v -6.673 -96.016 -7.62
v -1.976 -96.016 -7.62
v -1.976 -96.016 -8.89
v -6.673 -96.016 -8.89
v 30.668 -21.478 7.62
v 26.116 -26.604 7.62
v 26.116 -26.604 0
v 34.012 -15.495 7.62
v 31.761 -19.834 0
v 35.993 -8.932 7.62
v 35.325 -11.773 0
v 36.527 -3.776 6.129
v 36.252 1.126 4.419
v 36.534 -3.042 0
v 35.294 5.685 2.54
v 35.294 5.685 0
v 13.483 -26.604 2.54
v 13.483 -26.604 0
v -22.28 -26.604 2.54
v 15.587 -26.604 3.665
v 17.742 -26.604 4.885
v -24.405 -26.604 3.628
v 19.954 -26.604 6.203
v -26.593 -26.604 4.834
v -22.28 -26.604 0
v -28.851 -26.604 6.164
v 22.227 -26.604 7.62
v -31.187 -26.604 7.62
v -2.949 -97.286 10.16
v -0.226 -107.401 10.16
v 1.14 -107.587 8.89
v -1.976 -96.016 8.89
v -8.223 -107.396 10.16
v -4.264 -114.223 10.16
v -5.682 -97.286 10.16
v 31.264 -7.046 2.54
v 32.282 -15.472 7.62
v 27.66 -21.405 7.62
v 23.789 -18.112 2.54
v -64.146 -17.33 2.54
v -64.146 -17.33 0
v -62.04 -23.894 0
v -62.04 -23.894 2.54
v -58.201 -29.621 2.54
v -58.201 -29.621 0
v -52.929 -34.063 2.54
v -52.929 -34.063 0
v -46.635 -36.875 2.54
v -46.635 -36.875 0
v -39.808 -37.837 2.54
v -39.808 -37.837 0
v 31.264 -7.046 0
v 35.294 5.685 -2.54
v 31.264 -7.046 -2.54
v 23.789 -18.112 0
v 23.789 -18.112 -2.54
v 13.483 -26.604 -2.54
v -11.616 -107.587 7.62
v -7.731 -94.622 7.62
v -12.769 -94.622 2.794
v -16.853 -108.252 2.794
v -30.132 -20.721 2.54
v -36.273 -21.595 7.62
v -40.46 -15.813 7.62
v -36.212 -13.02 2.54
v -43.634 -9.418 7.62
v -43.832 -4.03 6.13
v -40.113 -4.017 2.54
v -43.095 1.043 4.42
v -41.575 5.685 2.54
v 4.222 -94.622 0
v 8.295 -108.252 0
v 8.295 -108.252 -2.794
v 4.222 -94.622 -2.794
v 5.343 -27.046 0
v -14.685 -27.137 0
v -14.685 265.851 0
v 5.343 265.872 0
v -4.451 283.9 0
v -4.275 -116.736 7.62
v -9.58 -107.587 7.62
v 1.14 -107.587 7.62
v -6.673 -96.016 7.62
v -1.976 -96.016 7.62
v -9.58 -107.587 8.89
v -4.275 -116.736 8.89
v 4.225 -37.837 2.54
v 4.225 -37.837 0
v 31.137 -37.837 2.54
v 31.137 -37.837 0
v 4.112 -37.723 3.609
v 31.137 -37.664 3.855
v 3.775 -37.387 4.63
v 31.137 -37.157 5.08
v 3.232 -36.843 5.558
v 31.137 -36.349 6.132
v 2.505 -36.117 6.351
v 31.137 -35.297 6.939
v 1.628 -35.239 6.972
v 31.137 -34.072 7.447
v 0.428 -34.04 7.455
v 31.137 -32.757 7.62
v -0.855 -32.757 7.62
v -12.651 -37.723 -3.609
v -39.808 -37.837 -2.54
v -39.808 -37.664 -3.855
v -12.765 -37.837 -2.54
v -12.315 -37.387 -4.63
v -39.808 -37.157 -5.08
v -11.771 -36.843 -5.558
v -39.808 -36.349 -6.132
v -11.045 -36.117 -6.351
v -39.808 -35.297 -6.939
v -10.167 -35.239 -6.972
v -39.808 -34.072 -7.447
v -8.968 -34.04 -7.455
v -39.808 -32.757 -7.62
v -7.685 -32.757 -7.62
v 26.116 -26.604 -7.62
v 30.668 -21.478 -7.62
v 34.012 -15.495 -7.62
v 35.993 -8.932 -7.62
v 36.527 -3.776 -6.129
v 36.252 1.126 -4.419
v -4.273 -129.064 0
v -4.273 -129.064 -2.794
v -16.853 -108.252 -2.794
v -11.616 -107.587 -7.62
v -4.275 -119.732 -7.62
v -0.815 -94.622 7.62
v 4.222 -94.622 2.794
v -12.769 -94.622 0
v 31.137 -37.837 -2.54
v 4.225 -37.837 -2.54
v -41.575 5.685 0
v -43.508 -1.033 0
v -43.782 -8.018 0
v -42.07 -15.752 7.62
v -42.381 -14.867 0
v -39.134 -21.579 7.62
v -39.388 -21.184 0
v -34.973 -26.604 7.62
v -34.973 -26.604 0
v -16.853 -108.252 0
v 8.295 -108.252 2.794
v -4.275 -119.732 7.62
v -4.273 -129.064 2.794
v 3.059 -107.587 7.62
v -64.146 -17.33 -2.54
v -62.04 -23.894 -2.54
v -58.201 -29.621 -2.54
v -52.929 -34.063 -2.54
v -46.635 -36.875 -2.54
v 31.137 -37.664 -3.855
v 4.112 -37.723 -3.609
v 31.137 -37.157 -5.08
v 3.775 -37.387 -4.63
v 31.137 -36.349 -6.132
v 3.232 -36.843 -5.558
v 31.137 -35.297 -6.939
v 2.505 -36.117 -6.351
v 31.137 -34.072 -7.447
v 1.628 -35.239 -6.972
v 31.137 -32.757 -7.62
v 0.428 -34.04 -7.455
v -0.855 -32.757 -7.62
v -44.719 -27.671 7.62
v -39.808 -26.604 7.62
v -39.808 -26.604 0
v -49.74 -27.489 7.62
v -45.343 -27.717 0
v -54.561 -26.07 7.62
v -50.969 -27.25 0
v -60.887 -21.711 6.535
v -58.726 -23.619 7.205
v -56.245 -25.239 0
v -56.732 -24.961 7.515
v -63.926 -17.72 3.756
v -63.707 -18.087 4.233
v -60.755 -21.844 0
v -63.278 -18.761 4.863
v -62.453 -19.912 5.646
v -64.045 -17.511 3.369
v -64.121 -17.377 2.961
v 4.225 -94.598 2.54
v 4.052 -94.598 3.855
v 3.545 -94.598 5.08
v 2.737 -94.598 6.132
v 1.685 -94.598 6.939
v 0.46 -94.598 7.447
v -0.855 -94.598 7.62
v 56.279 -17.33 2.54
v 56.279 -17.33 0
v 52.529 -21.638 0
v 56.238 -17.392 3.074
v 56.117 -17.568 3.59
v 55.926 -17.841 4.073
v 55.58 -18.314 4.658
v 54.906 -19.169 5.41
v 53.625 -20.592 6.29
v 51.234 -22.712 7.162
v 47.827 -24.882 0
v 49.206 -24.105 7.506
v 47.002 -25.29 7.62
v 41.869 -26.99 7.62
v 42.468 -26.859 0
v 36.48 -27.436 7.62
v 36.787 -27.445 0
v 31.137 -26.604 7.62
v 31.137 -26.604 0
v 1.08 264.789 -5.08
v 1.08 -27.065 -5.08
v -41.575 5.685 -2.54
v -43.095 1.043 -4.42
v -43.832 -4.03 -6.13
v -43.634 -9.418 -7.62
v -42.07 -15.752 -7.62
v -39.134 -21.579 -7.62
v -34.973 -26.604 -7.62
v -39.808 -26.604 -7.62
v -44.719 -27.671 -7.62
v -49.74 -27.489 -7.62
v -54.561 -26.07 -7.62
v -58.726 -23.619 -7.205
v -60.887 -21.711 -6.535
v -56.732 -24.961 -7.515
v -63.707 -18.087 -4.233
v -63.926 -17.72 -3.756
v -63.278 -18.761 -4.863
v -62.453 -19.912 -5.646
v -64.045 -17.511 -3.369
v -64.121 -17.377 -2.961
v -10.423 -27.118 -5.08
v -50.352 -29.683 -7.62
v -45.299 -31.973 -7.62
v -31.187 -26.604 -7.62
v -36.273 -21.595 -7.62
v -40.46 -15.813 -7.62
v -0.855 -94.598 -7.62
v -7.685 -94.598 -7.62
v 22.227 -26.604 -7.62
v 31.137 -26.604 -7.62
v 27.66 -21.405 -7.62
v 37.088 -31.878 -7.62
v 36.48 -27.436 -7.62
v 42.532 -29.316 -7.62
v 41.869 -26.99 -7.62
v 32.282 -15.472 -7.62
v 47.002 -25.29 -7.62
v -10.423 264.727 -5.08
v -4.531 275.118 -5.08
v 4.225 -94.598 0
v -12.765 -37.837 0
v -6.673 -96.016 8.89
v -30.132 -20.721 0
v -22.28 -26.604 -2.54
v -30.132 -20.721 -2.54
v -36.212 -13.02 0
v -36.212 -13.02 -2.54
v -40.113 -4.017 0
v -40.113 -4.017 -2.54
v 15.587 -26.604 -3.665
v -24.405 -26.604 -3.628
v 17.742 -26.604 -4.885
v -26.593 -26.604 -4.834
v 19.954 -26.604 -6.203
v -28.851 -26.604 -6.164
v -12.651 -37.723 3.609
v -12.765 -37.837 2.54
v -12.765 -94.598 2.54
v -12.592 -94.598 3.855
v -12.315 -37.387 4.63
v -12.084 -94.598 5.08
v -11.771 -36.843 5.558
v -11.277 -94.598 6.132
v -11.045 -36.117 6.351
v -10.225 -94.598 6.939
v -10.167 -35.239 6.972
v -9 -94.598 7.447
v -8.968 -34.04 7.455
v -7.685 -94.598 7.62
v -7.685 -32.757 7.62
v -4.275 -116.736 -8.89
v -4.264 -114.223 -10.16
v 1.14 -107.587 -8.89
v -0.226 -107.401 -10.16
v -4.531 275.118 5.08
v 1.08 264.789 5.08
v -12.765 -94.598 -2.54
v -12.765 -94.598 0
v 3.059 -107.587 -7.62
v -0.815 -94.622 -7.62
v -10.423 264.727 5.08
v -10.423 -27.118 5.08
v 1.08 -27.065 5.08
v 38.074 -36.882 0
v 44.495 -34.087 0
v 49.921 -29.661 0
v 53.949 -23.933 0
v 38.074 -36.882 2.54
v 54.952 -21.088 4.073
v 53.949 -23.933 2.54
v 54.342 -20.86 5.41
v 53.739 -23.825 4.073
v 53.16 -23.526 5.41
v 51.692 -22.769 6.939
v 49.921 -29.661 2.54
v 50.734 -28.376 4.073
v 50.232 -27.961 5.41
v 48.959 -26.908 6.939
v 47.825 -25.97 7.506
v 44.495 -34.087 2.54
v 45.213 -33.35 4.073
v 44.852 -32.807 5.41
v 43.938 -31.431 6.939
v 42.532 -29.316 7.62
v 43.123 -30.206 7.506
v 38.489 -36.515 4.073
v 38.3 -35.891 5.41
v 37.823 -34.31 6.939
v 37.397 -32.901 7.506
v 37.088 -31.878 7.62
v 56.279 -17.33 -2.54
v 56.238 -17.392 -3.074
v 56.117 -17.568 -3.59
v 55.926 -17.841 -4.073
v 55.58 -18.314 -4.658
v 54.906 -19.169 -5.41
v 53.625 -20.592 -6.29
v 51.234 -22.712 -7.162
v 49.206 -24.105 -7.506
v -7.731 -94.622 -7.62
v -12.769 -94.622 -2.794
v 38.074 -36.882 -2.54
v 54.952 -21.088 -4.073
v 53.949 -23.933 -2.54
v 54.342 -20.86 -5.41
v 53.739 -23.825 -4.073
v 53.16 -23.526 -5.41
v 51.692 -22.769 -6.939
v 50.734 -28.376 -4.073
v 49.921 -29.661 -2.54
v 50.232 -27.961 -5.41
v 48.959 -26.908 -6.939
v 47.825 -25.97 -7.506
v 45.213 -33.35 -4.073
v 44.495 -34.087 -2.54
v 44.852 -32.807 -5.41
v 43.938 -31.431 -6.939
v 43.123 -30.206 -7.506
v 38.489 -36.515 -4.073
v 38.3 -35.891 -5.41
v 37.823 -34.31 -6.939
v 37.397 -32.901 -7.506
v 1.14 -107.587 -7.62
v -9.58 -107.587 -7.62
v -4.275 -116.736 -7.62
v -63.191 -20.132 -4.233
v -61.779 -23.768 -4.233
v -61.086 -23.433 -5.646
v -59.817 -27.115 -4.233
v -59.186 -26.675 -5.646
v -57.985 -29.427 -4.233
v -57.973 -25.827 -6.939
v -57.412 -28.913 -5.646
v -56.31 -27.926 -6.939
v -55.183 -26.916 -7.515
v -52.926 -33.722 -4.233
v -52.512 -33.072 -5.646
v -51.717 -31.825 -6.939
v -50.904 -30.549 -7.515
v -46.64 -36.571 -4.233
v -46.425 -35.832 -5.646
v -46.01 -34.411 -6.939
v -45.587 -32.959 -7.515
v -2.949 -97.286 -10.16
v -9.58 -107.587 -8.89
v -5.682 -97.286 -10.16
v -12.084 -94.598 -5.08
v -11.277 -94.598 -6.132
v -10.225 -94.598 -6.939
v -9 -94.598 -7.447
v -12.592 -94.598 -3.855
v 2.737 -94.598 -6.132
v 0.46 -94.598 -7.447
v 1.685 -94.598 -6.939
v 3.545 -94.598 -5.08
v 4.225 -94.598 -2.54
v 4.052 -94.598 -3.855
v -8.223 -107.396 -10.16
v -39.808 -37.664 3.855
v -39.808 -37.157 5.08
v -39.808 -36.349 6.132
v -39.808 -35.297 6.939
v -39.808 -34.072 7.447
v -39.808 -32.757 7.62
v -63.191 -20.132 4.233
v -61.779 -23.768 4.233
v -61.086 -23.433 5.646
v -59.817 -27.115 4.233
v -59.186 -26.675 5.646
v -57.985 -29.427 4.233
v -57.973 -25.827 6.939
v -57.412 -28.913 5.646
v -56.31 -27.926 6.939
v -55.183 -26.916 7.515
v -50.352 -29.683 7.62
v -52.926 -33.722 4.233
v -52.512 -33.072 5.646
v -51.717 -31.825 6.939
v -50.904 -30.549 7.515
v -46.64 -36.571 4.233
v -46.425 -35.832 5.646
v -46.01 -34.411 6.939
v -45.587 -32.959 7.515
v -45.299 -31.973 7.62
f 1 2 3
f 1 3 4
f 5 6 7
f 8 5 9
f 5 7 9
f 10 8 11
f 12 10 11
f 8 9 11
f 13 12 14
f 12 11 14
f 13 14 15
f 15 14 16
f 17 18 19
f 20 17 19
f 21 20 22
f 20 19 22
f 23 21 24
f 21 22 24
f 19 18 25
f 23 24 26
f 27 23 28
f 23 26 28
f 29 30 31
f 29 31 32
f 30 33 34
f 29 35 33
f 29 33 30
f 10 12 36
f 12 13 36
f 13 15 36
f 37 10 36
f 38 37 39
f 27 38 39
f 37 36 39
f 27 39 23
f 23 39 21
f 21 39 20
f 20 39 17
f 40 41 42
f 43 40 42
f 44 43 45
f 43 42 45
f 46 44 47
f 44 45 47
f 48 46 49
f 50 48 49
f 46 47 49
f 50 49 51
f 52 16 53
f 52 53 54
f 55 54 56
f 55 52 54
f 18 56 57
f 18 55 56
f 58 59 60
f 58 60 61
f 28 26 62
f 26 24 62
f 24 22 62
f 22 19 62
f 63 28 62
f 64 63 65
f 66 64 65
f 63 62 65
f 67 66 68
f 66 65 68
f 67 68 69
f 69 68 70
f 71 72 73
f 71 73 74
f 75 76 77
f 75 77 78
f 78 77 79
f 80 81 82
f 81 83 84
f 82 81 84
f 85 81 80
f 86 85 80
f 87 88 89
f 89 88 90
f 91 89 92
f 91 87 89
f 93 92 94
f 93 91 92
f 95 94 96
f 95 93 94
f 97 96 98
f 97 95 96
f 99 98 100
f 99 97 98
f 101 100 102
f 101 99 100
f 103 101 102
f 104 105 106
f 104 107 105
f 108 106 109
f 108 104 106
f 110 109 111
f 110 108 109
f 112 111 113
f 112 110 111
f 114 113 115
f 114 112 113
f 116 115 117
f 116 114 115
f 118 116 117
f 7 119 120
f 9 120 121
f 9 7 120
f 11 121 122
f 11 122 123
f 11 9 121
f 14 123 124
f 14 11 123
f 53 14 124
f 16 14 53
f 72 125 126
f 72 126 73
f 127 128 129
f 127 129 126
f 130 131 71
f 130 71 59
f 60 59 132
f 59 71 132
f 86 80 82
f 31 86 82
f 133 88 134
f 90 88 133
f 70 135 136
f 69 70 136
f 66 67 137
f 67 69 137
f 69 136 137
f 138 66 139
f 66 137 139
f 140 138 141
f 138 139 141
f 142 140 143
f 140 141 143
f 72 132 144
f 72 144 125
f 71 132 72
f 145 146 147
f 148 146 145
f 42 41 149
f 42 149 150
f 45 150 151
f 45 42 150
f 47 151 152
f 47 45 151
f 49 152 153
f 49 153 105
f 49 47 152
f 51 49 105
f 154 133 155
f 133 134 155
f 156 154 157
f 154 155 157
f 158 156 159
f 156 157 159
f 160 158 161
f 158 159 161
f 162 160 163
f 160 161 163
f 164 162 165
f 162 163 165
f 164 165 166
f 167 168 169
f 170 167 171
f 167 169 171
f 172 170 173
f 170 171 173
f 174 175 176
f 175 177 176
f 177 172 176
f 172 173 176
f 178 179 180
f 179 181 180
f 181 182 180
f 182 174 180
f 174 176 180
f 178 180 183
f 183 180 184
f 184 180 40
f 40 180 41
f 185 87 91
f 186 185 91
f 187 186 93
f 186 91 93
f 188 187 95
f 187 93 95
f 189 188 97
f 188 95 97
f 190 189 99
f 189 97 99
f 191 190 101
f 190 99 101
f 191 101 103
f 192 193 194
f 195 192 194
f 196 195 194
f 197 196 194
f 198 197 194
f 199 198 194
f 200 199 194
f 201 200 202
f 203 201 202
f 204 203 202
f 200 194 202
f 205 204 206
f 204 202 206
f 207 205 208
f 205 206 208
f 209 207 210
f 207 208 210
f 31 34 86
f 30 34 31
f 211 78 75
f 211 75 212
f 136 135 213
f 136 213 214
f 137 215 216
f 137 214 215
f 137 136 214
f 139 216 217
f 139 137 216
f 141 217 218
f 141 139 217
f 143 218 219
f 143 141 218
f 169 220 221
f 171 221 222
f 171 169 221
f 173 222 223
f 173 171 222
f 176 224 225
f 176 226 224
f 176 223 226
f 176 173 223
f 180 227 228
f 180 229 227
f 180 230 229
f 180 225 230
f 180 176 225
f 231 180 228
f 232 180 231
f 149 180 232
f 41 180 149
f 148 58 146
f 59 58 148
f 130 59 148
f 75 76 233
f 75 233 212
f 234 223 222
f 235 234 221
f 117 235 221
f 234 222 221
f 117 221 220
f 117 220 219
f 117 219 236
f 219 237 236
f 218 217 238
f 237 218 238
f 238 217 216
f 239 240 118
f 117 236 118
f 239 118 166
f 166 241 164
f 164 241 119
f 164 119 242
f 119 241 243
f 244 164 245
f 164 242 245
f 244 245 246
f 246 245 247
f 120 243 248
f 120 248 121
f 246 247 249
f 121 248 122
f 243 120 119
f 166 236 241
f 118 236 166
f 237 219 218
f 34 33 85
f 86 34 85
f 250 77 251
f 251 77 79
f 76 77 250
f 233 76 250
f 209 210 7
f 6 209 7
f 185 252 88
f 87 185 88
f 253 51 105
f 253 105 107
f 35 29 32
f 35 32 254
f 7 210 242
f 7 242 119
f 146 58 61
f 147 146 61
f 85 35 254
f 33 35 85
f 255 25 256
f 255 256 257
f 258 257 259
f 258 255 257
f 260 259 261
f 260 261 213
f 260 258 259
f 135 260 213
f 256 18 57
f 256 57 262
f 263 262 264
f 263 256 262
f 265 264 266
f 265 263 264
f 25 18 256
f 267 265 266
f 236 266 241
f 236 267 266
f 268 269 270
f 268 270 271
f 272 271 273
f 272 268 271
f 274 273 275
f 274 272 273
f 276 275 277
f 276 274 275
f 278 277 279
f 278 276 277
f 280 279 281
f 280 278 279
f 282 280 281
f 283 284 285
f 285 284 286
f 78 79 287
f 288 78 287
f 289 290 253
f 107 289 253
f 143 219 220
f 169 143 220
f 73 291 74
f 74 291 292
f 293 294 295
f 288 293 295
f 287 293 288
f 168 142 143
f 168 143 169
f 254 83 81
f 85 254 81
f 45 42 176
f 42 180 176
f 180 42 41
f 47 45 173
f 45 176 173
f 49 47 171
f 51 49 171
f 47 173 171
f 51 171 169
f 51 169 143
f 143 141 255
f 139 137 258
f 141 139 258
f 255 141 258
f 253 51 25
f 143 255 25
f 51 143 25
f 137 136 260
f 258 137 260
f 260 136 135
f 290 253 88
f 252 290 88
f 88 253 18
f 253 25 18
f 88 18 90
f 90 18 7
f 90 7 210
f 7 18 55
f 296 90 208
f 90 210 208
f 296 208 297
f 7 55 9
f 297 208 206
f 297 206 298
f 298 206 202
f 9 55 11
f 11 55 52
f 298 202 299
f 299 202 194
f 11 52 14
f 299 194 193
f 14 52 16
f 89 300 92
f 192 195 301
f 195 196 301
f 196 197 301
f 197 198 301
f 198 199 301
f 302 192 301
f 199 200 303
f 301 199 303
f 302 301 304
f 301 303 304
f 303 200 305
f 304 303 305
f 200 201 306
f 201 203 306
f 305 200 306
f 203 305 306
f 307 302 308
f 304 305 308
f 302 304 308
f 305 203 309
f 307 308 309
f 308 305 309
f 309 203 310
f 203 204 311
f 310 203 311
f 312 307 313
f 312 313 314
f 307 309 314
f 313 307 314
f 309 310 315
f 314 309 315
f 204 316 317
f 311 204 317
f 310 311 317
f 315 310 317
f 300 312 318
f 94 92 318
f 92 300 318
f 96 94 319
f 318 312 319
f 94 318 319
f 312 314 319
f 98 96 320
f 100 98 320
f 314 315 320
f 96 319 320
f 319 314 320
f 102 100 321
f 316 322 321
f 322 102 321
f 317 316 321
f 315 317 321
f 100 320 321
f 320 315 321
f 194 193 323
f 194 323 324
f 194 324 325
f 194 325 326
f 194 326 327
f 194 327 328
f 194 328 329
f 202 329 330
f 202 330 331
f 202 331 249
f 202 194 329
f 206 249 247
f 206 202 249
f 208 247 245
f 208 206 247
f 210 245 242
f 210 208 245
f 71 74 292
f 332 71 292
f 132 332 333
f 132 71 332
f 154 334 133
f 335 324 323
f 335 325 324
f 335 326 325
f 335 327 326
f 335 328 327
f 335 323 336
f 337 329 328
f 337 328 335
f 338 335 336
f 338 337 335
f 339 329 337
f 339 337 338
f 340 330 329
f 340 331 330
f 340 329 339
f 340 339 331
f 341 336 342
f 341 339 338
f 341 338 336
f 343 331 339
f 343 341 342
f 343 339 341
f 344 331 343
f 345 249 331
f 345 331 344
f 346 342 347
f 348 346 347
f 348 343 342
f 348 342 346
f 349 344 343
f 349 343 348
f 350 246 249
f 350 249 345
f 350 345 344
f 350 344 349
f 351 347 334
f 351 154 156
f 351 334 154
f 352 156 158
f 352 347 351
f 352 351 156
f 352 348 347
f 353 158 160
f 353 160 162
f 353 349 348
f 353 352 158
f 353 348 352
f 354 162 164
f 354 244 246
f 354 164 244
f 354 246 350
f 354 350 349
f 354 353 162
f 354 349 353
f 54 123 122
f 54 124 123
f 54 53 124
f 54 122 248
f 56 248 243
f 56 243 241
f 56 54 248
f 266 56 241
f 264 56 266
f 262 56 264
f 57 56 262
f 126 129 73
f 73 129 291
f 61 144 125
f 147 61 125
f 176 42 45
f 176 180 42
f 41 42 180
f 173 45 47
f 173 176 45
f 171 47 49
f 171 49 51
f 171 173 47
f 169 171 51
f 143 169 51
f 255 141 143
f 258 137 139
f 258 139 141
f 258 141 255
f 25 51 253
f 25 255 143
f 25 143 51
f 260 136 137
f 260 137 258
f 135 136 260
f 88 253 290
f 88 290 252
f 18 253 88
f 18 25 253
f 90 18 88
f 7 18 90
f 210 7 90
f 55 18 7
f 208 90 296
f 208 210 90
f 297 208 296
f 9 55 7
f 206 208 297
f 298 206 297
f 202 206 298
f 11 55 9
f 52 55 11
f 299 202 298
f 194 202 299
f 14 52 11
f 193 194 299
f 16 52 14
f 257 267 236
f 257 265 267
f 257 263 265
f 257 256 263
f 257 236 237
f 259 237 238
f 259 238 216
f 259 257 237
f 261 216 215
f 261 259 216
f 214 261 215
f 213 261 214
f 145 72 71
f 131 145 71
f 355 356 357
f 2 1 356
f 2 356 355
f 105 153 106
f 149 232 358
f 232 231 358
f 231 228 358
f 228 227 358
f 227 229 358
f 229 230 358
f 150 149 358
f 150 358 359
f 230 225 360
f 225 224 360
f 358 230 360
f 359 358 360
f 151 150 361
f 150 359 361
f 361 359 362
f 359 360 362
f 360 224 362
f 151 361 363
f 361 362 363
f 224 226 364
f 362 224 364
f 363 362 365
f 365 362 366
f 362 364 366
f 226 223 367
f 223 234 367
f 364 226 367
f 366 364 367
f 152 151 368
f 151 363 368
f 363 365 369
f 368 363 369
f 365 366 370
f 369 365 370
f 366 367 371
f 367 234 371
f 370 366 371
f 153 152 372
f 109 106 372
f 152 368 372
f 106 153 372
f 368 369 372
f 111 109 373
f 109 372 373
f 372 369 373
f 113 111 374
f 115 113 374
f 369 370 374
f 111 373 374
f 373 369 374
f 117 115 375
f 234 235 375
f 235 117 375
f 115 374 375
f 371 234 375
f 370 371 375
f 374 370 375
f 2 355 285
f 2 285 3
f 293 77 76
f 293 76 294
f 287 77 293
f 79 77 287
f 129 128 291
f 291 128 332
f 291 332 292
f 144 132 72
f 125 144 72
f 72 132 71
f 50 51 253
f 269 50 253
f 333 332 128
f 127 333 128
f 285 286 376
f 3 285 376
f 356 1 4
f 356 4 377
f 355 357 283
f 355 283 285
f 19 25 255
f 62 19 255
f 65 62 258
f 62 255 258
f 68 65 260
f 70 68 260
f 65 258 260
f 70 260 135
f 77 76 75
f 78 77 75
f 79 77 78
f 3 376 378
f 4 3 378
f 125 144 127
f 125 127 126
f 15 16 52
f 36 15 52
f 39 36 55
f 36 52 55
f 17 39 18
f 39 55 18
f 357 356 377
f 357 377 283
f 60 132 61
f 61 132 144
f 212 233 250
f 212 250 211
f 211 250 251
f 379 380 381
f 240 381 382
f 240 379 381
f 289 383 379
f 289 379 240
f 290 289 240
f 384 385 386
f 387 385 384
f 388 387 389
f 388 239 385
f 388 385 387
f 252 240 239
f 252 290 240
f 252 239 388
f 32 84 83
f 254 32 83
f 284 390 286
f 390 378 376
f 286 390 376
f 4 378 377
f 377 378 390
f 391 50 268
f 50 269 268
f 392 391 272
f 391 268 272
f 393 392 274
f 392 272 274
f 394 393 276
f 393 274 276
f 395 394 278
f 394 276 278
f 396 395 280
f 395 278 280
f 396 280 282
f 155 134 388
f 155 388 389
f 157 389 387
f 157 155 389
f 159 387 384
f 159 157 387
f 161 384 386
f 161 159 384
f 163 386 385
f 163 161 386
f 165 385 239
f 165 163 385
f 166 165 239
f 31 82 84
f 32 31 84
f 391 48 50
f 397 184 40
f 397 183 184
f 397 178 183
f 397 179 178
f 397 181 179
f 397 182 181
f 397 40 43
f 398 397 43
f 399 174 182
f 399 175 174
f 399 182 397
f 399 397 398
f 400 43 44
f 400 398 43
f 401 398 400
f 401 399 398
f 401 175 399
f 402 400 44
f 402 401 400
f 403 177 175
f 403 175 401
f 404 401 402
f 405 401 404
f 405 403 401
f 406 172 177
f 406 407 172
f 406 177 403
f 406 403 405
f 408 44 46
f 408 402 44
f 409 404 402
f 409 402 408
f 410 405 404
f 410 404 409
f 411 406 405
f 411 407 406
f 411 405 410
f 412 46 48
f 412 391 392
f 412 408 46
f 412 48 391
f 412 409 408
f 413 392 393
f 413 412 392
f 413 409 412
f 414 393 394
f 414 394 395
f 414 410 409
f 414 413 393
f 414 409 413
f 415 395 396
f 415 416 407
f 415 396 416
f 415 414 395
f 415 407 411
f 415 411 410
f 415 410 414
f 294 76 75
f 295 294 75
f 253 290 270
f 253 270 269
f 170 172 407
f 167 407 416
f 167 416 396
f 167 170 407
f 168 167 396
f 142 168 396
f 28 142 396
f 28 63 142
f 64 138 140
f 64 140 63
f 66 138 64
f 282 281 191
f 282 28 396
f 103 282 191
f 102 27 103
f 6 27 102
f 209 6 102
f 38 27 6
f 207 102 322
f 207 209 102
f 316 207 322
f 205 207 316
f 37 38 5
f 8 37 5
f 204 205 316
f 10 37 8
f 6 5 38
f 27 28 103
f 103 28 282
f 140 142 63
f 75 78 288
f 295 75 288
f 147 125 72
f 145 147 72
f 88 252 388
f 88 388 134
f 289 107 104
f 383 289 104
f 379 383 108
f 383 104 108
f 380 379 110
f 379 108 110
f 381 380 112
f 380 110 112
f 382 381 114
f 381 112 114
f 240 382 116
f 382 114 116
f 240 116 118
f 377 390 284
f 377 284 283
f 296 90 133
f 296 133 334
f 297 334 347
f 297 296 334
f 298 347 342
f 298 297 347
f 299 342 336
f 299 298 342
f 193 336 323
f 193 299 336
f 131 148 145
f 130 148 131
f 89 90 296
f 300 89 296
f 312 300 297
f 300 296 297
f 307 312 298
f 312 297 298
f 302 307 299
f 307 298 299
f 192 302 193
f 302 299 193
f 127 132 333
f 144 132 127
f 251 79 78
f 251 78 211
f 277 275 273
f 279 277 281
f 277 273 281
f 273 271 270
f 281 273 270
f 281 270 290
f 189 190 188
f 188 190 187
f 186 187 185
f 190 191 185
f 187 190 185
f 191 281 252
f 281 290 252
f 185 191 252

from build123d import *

# Parameters (mm, degrees)
F0_W        = 16.9903710485
F0_H        = 11.2329293042
F0_H_2      = 56.7607395351
F1_DEPTH    = 7.62
F2_R        = 5.08
F4_DEPTH    = 5.08
F5_T1_DEPTH = 332.8395862184
F5_T3_DEPTH = 332.7291762168
F5_T5_DEPTH = 64.4306283308
F5_T7_DEPTH = 64.1781797191
F6_R        = 5.08
F7_SIZE     = 5.08
F9_DEPTH    = 7.62
F10_SIZE    = 4.826
F12_DEPTH   = 2.54
F13_SIZE    = 1.27


# Not quite as in the source:
# - a fillet or chamfer that OpenCascade refuses, or shapes differently, is made with other operations: its cross-section is extruded or revolved along the edge and cut away or added


with BuildPart() as f1:
    # F0 (on Top) → F1 (new body)
    with BuildSketch(Plane.XY):
        with Locations((-4.2698672041, -32.2207761928)):
            Rectangle(F0_W, F0_H)
        Polygon((-12.7650527284, -37.837240845), (-12.7650527284, -26.6043115407), (-22.2795344889, -26.6043115407), (-34.9734351039, -26.6043115407), (-39.8079305887, -26.6043115407), (-39.8079305887, -37.837240845), align=None)
        Polygon((13.4834656492, -26.6043115407), (4.2253183201, -26.6043115407), (4.2253183201, -37.837240845), (31.1368945986, -37.837240845), (31.1368945986, -26.6043115407), (26.1162724346, -26.6043115407), align=None)
        with Locations((-4.2698672041, -66.2176106125)):
            Rectangle(F0_W, F0_H_2)
        with BuildLine():
            Line((-34.9734351039, -26.6043115407), (-22.2795344889, -26.6043115407))
            ThreePointArc((-22.2795344889, -26.6043115407), (-36.2117622733, -13.0200039257), (-41.5752306581, 5.6849042885))
            ThreePointArc((-41.5752306581, 5.6849042885), (-43.2880257194, -11.4847943334), (-34.9734351039, -26.6043115407))
        make_face()
        with BuildLine():
            ThreePointArc((35.2943129838, 5.6849042885), (27.9247695922, -12.8481340326), (13.4834656492, -26.6043115407))
            Line((13.4834656492, -26.6043115407), (26.1162724346, -26.6043115407))
            ThreePointArc((26.1162724346, -26.6043115407), (35.3252385886, -11.7728990546), (35.2943129838, 5.6849042885))
        make_face()
        with BuildLine():
            ThreePointArc((-64.1463175416, -17.3298995942), (-55.7210393724, -32.026898994), (-39.8079305887, -37.837240845))
            Line((-39.8079305887, -37.837240845), (-39.8079305887, -26.6043115407))
            ThreePointArc((-39.8079305887, -26.6043115407), (-53.6778361214, -26.4302012719), (-64.1463175416, -17.3298995942))
        make_face()
        with BuildLine():
            Line((31.1368945986, -26.6043115407), (31.1368945986, -37.837240845))
            ThreePointArc((31.1368945986, -37.837240845), (47.3595070101, -32.0602618252), (56.2793202698, -17.3298995942))
            ThreePointArc((56.2793202698, -17.3298995942), (45.2099392934, -26.038489943), (31.1368945986, -26.6043115407))
        make_face()
    extrude(amount=F1_DEPTH)

    # F2
    f2_edges = [f1.edges().sort_by_distance(p)[0] for p in [
        (-12.765053, -66.217611, 7.62),
        (4.225318, -66.217611, 7.62),
    ]]
    fillet(f2_edges, radius=F2_R)

    # F6
    f6_edges = [f1.edges().sort_by_distance(p)[0] for p in [
        (-26.286492, -37.837241, 7.62),
        (17.681106, -37.837241, 7.62),
        (-55.721039, -32.026899, 7.62),
        (47.359507, -32.060262, 7.62),
    ]]
    fillet(f6_edges, radius=F6_R)

    # F7
    f7_edges = [f1.edges().sort_by_distance(p)[0] for p in [
        (-36.211762, -13.020004, 7.62),
        (27.92477, -12.848134, 7.62),
    ]]
    chamfer(f7_edges, length=F7_SIZE)


with BuildPart() as f4:
    # F3 (on Top) → F4 (new body)
    with BuildSketch(Plane.XY):
        Polygon((-16.8165620416, 266.4132416248), (-16.8165620416, -27.1466755785), (7.4740615673, -27.036265577), (7.4740615673, 266.4132416248), (-4.4111721218, 288.2919311523), align=None)
    extrude(amount=F4_DEPTH)

    # F5: chamfer of 7.62 x 6.3939391896 on 4 edges, made by hand

    # F5_s2 → F5_t1 (cut)
    with BuildSketch(Plane.XZ.offset(-286.0530761323)):
        Polygon((-16.8165620416, -2.54), (-10.4226228521, 5.08), (-16.8165620416, 5.08), align=None)
    extrude(amount=F5_T1_DEPTH, mode=Mode.SUBTRACT)

    # F5_s4 → F5_t3 (cut)
    with BuildSketch(Plane.XZ.offset(-286.0530761323)):
        Polygon((7.4740615673, -2.54), (1.0801223778, 5.08), (7.4740615673, 5.08), align=None)
    extrude(amount=F5_T3_DEPTH, mode=Mode.SUBTRACT)

    # F5_s6 → F5_t5 (cut)
    with BuildSketch(Plane(origin=(132.309777211, 233.3473236835, 0), x_dir=(0, 0, 1), z_dir=(-0.4932372465, -0.869894832, 0))):
        Polygon((-2.54, 146.0335741426), (5.08, 139.6396349531), (5.08, 146.0335741426), align=None)
    extrude(amount=F5_T5_DEPTH, mode=Mode.SUBTRACT)

    # F5_s8 → F5_t7 (cut)
    with BuildSketch(Plane(origin=(-100.6695105648, 185.3154110511, 0), x_dir=(0, 0, 1), z_dir=(-0.4773471727, 0.8787147869, 0))):
        Polygon((-2.54, 133.7391760771), (5.08, 127.3452368875), (5.08, 133.7391760771), align=None)
    extrude(amount=F5_T7_DEPTH, mode=Mode.SUBTRACT)


with BuildPart() as f9:
    # F8 (on Top) → F9 (new body)
    with BuildSketch(Plane.XY):
        Polygon((4.2217592709, -94.6217030287), (-12.7686117776, -94.6217030287), (-16.8529637158, -108.2521602511), (-4.2734262533, -129.0639638901), (8.2952212542, -108.2521602511), align=None)
    extrude(amount=F9_DEPTH)

    # F10
    f10_edges = [f9.edges().sort_by_distance(p)[0] for p in [
        (-10.563195, -118.658062, 7.62),
        (2.010898, -118.658062, 7.62),
        (-14.810788, -101.436932, 7.62),
        (6.25849, -101.436932, 7.62),
    ]]
    chamfer(f10_edges, length=F10_SIZE)


with BuildPart() as f12:
    # F11 (on face) → F12 (new body)
    with BuildSketch(Plane.XY.offset(7.62)):
        Polygon((-4.2752149429, -116.7355105281), (1.1395043943, -107.5873051191), (-1.9756610023, -96.0157086394), (-6.6725995569, -96.0157086394), (-9.5803312475, -107.5873051191), align=None)
    extrude(amount=F12_DEPTH)

    # F13
    f13_edges = [f12.edges().sort_by_distance(p)[0] for p in [
        (-8.126465, -101.801507, 10.16),
        (-4.32413, -96.015709, 10.16),
        (-0.418078, -101.801507, 10.16),
        (-1.567855, -112.161408, 10.16),
        (-6.927773, -112.161408, 10.16),
    ]]
    chamfer(f13_edges, length=F13_SIZE)


with BuildPart() as f14_1:
    # F14: instance of F4
    add(f4.part.mirror(Plane.XY))


with BuildPart() as f14_2:
    # F14: instance of F1
    add(f1.part.mirror(Plane.XY))


with BuildPart() as f14_3:
    # F14: instance of F12
    add(f12.part.mirror(Plane.XY))


with BuildPart() as f14_4:
    # F14: instance of F9
    add(f9.part.mirror(Plane.XY))


solid = Compound([f1.part, f4.part, f9.part, f12.part, f14_1.part, f14_2.part, f14_3.part, f14_4.part])
